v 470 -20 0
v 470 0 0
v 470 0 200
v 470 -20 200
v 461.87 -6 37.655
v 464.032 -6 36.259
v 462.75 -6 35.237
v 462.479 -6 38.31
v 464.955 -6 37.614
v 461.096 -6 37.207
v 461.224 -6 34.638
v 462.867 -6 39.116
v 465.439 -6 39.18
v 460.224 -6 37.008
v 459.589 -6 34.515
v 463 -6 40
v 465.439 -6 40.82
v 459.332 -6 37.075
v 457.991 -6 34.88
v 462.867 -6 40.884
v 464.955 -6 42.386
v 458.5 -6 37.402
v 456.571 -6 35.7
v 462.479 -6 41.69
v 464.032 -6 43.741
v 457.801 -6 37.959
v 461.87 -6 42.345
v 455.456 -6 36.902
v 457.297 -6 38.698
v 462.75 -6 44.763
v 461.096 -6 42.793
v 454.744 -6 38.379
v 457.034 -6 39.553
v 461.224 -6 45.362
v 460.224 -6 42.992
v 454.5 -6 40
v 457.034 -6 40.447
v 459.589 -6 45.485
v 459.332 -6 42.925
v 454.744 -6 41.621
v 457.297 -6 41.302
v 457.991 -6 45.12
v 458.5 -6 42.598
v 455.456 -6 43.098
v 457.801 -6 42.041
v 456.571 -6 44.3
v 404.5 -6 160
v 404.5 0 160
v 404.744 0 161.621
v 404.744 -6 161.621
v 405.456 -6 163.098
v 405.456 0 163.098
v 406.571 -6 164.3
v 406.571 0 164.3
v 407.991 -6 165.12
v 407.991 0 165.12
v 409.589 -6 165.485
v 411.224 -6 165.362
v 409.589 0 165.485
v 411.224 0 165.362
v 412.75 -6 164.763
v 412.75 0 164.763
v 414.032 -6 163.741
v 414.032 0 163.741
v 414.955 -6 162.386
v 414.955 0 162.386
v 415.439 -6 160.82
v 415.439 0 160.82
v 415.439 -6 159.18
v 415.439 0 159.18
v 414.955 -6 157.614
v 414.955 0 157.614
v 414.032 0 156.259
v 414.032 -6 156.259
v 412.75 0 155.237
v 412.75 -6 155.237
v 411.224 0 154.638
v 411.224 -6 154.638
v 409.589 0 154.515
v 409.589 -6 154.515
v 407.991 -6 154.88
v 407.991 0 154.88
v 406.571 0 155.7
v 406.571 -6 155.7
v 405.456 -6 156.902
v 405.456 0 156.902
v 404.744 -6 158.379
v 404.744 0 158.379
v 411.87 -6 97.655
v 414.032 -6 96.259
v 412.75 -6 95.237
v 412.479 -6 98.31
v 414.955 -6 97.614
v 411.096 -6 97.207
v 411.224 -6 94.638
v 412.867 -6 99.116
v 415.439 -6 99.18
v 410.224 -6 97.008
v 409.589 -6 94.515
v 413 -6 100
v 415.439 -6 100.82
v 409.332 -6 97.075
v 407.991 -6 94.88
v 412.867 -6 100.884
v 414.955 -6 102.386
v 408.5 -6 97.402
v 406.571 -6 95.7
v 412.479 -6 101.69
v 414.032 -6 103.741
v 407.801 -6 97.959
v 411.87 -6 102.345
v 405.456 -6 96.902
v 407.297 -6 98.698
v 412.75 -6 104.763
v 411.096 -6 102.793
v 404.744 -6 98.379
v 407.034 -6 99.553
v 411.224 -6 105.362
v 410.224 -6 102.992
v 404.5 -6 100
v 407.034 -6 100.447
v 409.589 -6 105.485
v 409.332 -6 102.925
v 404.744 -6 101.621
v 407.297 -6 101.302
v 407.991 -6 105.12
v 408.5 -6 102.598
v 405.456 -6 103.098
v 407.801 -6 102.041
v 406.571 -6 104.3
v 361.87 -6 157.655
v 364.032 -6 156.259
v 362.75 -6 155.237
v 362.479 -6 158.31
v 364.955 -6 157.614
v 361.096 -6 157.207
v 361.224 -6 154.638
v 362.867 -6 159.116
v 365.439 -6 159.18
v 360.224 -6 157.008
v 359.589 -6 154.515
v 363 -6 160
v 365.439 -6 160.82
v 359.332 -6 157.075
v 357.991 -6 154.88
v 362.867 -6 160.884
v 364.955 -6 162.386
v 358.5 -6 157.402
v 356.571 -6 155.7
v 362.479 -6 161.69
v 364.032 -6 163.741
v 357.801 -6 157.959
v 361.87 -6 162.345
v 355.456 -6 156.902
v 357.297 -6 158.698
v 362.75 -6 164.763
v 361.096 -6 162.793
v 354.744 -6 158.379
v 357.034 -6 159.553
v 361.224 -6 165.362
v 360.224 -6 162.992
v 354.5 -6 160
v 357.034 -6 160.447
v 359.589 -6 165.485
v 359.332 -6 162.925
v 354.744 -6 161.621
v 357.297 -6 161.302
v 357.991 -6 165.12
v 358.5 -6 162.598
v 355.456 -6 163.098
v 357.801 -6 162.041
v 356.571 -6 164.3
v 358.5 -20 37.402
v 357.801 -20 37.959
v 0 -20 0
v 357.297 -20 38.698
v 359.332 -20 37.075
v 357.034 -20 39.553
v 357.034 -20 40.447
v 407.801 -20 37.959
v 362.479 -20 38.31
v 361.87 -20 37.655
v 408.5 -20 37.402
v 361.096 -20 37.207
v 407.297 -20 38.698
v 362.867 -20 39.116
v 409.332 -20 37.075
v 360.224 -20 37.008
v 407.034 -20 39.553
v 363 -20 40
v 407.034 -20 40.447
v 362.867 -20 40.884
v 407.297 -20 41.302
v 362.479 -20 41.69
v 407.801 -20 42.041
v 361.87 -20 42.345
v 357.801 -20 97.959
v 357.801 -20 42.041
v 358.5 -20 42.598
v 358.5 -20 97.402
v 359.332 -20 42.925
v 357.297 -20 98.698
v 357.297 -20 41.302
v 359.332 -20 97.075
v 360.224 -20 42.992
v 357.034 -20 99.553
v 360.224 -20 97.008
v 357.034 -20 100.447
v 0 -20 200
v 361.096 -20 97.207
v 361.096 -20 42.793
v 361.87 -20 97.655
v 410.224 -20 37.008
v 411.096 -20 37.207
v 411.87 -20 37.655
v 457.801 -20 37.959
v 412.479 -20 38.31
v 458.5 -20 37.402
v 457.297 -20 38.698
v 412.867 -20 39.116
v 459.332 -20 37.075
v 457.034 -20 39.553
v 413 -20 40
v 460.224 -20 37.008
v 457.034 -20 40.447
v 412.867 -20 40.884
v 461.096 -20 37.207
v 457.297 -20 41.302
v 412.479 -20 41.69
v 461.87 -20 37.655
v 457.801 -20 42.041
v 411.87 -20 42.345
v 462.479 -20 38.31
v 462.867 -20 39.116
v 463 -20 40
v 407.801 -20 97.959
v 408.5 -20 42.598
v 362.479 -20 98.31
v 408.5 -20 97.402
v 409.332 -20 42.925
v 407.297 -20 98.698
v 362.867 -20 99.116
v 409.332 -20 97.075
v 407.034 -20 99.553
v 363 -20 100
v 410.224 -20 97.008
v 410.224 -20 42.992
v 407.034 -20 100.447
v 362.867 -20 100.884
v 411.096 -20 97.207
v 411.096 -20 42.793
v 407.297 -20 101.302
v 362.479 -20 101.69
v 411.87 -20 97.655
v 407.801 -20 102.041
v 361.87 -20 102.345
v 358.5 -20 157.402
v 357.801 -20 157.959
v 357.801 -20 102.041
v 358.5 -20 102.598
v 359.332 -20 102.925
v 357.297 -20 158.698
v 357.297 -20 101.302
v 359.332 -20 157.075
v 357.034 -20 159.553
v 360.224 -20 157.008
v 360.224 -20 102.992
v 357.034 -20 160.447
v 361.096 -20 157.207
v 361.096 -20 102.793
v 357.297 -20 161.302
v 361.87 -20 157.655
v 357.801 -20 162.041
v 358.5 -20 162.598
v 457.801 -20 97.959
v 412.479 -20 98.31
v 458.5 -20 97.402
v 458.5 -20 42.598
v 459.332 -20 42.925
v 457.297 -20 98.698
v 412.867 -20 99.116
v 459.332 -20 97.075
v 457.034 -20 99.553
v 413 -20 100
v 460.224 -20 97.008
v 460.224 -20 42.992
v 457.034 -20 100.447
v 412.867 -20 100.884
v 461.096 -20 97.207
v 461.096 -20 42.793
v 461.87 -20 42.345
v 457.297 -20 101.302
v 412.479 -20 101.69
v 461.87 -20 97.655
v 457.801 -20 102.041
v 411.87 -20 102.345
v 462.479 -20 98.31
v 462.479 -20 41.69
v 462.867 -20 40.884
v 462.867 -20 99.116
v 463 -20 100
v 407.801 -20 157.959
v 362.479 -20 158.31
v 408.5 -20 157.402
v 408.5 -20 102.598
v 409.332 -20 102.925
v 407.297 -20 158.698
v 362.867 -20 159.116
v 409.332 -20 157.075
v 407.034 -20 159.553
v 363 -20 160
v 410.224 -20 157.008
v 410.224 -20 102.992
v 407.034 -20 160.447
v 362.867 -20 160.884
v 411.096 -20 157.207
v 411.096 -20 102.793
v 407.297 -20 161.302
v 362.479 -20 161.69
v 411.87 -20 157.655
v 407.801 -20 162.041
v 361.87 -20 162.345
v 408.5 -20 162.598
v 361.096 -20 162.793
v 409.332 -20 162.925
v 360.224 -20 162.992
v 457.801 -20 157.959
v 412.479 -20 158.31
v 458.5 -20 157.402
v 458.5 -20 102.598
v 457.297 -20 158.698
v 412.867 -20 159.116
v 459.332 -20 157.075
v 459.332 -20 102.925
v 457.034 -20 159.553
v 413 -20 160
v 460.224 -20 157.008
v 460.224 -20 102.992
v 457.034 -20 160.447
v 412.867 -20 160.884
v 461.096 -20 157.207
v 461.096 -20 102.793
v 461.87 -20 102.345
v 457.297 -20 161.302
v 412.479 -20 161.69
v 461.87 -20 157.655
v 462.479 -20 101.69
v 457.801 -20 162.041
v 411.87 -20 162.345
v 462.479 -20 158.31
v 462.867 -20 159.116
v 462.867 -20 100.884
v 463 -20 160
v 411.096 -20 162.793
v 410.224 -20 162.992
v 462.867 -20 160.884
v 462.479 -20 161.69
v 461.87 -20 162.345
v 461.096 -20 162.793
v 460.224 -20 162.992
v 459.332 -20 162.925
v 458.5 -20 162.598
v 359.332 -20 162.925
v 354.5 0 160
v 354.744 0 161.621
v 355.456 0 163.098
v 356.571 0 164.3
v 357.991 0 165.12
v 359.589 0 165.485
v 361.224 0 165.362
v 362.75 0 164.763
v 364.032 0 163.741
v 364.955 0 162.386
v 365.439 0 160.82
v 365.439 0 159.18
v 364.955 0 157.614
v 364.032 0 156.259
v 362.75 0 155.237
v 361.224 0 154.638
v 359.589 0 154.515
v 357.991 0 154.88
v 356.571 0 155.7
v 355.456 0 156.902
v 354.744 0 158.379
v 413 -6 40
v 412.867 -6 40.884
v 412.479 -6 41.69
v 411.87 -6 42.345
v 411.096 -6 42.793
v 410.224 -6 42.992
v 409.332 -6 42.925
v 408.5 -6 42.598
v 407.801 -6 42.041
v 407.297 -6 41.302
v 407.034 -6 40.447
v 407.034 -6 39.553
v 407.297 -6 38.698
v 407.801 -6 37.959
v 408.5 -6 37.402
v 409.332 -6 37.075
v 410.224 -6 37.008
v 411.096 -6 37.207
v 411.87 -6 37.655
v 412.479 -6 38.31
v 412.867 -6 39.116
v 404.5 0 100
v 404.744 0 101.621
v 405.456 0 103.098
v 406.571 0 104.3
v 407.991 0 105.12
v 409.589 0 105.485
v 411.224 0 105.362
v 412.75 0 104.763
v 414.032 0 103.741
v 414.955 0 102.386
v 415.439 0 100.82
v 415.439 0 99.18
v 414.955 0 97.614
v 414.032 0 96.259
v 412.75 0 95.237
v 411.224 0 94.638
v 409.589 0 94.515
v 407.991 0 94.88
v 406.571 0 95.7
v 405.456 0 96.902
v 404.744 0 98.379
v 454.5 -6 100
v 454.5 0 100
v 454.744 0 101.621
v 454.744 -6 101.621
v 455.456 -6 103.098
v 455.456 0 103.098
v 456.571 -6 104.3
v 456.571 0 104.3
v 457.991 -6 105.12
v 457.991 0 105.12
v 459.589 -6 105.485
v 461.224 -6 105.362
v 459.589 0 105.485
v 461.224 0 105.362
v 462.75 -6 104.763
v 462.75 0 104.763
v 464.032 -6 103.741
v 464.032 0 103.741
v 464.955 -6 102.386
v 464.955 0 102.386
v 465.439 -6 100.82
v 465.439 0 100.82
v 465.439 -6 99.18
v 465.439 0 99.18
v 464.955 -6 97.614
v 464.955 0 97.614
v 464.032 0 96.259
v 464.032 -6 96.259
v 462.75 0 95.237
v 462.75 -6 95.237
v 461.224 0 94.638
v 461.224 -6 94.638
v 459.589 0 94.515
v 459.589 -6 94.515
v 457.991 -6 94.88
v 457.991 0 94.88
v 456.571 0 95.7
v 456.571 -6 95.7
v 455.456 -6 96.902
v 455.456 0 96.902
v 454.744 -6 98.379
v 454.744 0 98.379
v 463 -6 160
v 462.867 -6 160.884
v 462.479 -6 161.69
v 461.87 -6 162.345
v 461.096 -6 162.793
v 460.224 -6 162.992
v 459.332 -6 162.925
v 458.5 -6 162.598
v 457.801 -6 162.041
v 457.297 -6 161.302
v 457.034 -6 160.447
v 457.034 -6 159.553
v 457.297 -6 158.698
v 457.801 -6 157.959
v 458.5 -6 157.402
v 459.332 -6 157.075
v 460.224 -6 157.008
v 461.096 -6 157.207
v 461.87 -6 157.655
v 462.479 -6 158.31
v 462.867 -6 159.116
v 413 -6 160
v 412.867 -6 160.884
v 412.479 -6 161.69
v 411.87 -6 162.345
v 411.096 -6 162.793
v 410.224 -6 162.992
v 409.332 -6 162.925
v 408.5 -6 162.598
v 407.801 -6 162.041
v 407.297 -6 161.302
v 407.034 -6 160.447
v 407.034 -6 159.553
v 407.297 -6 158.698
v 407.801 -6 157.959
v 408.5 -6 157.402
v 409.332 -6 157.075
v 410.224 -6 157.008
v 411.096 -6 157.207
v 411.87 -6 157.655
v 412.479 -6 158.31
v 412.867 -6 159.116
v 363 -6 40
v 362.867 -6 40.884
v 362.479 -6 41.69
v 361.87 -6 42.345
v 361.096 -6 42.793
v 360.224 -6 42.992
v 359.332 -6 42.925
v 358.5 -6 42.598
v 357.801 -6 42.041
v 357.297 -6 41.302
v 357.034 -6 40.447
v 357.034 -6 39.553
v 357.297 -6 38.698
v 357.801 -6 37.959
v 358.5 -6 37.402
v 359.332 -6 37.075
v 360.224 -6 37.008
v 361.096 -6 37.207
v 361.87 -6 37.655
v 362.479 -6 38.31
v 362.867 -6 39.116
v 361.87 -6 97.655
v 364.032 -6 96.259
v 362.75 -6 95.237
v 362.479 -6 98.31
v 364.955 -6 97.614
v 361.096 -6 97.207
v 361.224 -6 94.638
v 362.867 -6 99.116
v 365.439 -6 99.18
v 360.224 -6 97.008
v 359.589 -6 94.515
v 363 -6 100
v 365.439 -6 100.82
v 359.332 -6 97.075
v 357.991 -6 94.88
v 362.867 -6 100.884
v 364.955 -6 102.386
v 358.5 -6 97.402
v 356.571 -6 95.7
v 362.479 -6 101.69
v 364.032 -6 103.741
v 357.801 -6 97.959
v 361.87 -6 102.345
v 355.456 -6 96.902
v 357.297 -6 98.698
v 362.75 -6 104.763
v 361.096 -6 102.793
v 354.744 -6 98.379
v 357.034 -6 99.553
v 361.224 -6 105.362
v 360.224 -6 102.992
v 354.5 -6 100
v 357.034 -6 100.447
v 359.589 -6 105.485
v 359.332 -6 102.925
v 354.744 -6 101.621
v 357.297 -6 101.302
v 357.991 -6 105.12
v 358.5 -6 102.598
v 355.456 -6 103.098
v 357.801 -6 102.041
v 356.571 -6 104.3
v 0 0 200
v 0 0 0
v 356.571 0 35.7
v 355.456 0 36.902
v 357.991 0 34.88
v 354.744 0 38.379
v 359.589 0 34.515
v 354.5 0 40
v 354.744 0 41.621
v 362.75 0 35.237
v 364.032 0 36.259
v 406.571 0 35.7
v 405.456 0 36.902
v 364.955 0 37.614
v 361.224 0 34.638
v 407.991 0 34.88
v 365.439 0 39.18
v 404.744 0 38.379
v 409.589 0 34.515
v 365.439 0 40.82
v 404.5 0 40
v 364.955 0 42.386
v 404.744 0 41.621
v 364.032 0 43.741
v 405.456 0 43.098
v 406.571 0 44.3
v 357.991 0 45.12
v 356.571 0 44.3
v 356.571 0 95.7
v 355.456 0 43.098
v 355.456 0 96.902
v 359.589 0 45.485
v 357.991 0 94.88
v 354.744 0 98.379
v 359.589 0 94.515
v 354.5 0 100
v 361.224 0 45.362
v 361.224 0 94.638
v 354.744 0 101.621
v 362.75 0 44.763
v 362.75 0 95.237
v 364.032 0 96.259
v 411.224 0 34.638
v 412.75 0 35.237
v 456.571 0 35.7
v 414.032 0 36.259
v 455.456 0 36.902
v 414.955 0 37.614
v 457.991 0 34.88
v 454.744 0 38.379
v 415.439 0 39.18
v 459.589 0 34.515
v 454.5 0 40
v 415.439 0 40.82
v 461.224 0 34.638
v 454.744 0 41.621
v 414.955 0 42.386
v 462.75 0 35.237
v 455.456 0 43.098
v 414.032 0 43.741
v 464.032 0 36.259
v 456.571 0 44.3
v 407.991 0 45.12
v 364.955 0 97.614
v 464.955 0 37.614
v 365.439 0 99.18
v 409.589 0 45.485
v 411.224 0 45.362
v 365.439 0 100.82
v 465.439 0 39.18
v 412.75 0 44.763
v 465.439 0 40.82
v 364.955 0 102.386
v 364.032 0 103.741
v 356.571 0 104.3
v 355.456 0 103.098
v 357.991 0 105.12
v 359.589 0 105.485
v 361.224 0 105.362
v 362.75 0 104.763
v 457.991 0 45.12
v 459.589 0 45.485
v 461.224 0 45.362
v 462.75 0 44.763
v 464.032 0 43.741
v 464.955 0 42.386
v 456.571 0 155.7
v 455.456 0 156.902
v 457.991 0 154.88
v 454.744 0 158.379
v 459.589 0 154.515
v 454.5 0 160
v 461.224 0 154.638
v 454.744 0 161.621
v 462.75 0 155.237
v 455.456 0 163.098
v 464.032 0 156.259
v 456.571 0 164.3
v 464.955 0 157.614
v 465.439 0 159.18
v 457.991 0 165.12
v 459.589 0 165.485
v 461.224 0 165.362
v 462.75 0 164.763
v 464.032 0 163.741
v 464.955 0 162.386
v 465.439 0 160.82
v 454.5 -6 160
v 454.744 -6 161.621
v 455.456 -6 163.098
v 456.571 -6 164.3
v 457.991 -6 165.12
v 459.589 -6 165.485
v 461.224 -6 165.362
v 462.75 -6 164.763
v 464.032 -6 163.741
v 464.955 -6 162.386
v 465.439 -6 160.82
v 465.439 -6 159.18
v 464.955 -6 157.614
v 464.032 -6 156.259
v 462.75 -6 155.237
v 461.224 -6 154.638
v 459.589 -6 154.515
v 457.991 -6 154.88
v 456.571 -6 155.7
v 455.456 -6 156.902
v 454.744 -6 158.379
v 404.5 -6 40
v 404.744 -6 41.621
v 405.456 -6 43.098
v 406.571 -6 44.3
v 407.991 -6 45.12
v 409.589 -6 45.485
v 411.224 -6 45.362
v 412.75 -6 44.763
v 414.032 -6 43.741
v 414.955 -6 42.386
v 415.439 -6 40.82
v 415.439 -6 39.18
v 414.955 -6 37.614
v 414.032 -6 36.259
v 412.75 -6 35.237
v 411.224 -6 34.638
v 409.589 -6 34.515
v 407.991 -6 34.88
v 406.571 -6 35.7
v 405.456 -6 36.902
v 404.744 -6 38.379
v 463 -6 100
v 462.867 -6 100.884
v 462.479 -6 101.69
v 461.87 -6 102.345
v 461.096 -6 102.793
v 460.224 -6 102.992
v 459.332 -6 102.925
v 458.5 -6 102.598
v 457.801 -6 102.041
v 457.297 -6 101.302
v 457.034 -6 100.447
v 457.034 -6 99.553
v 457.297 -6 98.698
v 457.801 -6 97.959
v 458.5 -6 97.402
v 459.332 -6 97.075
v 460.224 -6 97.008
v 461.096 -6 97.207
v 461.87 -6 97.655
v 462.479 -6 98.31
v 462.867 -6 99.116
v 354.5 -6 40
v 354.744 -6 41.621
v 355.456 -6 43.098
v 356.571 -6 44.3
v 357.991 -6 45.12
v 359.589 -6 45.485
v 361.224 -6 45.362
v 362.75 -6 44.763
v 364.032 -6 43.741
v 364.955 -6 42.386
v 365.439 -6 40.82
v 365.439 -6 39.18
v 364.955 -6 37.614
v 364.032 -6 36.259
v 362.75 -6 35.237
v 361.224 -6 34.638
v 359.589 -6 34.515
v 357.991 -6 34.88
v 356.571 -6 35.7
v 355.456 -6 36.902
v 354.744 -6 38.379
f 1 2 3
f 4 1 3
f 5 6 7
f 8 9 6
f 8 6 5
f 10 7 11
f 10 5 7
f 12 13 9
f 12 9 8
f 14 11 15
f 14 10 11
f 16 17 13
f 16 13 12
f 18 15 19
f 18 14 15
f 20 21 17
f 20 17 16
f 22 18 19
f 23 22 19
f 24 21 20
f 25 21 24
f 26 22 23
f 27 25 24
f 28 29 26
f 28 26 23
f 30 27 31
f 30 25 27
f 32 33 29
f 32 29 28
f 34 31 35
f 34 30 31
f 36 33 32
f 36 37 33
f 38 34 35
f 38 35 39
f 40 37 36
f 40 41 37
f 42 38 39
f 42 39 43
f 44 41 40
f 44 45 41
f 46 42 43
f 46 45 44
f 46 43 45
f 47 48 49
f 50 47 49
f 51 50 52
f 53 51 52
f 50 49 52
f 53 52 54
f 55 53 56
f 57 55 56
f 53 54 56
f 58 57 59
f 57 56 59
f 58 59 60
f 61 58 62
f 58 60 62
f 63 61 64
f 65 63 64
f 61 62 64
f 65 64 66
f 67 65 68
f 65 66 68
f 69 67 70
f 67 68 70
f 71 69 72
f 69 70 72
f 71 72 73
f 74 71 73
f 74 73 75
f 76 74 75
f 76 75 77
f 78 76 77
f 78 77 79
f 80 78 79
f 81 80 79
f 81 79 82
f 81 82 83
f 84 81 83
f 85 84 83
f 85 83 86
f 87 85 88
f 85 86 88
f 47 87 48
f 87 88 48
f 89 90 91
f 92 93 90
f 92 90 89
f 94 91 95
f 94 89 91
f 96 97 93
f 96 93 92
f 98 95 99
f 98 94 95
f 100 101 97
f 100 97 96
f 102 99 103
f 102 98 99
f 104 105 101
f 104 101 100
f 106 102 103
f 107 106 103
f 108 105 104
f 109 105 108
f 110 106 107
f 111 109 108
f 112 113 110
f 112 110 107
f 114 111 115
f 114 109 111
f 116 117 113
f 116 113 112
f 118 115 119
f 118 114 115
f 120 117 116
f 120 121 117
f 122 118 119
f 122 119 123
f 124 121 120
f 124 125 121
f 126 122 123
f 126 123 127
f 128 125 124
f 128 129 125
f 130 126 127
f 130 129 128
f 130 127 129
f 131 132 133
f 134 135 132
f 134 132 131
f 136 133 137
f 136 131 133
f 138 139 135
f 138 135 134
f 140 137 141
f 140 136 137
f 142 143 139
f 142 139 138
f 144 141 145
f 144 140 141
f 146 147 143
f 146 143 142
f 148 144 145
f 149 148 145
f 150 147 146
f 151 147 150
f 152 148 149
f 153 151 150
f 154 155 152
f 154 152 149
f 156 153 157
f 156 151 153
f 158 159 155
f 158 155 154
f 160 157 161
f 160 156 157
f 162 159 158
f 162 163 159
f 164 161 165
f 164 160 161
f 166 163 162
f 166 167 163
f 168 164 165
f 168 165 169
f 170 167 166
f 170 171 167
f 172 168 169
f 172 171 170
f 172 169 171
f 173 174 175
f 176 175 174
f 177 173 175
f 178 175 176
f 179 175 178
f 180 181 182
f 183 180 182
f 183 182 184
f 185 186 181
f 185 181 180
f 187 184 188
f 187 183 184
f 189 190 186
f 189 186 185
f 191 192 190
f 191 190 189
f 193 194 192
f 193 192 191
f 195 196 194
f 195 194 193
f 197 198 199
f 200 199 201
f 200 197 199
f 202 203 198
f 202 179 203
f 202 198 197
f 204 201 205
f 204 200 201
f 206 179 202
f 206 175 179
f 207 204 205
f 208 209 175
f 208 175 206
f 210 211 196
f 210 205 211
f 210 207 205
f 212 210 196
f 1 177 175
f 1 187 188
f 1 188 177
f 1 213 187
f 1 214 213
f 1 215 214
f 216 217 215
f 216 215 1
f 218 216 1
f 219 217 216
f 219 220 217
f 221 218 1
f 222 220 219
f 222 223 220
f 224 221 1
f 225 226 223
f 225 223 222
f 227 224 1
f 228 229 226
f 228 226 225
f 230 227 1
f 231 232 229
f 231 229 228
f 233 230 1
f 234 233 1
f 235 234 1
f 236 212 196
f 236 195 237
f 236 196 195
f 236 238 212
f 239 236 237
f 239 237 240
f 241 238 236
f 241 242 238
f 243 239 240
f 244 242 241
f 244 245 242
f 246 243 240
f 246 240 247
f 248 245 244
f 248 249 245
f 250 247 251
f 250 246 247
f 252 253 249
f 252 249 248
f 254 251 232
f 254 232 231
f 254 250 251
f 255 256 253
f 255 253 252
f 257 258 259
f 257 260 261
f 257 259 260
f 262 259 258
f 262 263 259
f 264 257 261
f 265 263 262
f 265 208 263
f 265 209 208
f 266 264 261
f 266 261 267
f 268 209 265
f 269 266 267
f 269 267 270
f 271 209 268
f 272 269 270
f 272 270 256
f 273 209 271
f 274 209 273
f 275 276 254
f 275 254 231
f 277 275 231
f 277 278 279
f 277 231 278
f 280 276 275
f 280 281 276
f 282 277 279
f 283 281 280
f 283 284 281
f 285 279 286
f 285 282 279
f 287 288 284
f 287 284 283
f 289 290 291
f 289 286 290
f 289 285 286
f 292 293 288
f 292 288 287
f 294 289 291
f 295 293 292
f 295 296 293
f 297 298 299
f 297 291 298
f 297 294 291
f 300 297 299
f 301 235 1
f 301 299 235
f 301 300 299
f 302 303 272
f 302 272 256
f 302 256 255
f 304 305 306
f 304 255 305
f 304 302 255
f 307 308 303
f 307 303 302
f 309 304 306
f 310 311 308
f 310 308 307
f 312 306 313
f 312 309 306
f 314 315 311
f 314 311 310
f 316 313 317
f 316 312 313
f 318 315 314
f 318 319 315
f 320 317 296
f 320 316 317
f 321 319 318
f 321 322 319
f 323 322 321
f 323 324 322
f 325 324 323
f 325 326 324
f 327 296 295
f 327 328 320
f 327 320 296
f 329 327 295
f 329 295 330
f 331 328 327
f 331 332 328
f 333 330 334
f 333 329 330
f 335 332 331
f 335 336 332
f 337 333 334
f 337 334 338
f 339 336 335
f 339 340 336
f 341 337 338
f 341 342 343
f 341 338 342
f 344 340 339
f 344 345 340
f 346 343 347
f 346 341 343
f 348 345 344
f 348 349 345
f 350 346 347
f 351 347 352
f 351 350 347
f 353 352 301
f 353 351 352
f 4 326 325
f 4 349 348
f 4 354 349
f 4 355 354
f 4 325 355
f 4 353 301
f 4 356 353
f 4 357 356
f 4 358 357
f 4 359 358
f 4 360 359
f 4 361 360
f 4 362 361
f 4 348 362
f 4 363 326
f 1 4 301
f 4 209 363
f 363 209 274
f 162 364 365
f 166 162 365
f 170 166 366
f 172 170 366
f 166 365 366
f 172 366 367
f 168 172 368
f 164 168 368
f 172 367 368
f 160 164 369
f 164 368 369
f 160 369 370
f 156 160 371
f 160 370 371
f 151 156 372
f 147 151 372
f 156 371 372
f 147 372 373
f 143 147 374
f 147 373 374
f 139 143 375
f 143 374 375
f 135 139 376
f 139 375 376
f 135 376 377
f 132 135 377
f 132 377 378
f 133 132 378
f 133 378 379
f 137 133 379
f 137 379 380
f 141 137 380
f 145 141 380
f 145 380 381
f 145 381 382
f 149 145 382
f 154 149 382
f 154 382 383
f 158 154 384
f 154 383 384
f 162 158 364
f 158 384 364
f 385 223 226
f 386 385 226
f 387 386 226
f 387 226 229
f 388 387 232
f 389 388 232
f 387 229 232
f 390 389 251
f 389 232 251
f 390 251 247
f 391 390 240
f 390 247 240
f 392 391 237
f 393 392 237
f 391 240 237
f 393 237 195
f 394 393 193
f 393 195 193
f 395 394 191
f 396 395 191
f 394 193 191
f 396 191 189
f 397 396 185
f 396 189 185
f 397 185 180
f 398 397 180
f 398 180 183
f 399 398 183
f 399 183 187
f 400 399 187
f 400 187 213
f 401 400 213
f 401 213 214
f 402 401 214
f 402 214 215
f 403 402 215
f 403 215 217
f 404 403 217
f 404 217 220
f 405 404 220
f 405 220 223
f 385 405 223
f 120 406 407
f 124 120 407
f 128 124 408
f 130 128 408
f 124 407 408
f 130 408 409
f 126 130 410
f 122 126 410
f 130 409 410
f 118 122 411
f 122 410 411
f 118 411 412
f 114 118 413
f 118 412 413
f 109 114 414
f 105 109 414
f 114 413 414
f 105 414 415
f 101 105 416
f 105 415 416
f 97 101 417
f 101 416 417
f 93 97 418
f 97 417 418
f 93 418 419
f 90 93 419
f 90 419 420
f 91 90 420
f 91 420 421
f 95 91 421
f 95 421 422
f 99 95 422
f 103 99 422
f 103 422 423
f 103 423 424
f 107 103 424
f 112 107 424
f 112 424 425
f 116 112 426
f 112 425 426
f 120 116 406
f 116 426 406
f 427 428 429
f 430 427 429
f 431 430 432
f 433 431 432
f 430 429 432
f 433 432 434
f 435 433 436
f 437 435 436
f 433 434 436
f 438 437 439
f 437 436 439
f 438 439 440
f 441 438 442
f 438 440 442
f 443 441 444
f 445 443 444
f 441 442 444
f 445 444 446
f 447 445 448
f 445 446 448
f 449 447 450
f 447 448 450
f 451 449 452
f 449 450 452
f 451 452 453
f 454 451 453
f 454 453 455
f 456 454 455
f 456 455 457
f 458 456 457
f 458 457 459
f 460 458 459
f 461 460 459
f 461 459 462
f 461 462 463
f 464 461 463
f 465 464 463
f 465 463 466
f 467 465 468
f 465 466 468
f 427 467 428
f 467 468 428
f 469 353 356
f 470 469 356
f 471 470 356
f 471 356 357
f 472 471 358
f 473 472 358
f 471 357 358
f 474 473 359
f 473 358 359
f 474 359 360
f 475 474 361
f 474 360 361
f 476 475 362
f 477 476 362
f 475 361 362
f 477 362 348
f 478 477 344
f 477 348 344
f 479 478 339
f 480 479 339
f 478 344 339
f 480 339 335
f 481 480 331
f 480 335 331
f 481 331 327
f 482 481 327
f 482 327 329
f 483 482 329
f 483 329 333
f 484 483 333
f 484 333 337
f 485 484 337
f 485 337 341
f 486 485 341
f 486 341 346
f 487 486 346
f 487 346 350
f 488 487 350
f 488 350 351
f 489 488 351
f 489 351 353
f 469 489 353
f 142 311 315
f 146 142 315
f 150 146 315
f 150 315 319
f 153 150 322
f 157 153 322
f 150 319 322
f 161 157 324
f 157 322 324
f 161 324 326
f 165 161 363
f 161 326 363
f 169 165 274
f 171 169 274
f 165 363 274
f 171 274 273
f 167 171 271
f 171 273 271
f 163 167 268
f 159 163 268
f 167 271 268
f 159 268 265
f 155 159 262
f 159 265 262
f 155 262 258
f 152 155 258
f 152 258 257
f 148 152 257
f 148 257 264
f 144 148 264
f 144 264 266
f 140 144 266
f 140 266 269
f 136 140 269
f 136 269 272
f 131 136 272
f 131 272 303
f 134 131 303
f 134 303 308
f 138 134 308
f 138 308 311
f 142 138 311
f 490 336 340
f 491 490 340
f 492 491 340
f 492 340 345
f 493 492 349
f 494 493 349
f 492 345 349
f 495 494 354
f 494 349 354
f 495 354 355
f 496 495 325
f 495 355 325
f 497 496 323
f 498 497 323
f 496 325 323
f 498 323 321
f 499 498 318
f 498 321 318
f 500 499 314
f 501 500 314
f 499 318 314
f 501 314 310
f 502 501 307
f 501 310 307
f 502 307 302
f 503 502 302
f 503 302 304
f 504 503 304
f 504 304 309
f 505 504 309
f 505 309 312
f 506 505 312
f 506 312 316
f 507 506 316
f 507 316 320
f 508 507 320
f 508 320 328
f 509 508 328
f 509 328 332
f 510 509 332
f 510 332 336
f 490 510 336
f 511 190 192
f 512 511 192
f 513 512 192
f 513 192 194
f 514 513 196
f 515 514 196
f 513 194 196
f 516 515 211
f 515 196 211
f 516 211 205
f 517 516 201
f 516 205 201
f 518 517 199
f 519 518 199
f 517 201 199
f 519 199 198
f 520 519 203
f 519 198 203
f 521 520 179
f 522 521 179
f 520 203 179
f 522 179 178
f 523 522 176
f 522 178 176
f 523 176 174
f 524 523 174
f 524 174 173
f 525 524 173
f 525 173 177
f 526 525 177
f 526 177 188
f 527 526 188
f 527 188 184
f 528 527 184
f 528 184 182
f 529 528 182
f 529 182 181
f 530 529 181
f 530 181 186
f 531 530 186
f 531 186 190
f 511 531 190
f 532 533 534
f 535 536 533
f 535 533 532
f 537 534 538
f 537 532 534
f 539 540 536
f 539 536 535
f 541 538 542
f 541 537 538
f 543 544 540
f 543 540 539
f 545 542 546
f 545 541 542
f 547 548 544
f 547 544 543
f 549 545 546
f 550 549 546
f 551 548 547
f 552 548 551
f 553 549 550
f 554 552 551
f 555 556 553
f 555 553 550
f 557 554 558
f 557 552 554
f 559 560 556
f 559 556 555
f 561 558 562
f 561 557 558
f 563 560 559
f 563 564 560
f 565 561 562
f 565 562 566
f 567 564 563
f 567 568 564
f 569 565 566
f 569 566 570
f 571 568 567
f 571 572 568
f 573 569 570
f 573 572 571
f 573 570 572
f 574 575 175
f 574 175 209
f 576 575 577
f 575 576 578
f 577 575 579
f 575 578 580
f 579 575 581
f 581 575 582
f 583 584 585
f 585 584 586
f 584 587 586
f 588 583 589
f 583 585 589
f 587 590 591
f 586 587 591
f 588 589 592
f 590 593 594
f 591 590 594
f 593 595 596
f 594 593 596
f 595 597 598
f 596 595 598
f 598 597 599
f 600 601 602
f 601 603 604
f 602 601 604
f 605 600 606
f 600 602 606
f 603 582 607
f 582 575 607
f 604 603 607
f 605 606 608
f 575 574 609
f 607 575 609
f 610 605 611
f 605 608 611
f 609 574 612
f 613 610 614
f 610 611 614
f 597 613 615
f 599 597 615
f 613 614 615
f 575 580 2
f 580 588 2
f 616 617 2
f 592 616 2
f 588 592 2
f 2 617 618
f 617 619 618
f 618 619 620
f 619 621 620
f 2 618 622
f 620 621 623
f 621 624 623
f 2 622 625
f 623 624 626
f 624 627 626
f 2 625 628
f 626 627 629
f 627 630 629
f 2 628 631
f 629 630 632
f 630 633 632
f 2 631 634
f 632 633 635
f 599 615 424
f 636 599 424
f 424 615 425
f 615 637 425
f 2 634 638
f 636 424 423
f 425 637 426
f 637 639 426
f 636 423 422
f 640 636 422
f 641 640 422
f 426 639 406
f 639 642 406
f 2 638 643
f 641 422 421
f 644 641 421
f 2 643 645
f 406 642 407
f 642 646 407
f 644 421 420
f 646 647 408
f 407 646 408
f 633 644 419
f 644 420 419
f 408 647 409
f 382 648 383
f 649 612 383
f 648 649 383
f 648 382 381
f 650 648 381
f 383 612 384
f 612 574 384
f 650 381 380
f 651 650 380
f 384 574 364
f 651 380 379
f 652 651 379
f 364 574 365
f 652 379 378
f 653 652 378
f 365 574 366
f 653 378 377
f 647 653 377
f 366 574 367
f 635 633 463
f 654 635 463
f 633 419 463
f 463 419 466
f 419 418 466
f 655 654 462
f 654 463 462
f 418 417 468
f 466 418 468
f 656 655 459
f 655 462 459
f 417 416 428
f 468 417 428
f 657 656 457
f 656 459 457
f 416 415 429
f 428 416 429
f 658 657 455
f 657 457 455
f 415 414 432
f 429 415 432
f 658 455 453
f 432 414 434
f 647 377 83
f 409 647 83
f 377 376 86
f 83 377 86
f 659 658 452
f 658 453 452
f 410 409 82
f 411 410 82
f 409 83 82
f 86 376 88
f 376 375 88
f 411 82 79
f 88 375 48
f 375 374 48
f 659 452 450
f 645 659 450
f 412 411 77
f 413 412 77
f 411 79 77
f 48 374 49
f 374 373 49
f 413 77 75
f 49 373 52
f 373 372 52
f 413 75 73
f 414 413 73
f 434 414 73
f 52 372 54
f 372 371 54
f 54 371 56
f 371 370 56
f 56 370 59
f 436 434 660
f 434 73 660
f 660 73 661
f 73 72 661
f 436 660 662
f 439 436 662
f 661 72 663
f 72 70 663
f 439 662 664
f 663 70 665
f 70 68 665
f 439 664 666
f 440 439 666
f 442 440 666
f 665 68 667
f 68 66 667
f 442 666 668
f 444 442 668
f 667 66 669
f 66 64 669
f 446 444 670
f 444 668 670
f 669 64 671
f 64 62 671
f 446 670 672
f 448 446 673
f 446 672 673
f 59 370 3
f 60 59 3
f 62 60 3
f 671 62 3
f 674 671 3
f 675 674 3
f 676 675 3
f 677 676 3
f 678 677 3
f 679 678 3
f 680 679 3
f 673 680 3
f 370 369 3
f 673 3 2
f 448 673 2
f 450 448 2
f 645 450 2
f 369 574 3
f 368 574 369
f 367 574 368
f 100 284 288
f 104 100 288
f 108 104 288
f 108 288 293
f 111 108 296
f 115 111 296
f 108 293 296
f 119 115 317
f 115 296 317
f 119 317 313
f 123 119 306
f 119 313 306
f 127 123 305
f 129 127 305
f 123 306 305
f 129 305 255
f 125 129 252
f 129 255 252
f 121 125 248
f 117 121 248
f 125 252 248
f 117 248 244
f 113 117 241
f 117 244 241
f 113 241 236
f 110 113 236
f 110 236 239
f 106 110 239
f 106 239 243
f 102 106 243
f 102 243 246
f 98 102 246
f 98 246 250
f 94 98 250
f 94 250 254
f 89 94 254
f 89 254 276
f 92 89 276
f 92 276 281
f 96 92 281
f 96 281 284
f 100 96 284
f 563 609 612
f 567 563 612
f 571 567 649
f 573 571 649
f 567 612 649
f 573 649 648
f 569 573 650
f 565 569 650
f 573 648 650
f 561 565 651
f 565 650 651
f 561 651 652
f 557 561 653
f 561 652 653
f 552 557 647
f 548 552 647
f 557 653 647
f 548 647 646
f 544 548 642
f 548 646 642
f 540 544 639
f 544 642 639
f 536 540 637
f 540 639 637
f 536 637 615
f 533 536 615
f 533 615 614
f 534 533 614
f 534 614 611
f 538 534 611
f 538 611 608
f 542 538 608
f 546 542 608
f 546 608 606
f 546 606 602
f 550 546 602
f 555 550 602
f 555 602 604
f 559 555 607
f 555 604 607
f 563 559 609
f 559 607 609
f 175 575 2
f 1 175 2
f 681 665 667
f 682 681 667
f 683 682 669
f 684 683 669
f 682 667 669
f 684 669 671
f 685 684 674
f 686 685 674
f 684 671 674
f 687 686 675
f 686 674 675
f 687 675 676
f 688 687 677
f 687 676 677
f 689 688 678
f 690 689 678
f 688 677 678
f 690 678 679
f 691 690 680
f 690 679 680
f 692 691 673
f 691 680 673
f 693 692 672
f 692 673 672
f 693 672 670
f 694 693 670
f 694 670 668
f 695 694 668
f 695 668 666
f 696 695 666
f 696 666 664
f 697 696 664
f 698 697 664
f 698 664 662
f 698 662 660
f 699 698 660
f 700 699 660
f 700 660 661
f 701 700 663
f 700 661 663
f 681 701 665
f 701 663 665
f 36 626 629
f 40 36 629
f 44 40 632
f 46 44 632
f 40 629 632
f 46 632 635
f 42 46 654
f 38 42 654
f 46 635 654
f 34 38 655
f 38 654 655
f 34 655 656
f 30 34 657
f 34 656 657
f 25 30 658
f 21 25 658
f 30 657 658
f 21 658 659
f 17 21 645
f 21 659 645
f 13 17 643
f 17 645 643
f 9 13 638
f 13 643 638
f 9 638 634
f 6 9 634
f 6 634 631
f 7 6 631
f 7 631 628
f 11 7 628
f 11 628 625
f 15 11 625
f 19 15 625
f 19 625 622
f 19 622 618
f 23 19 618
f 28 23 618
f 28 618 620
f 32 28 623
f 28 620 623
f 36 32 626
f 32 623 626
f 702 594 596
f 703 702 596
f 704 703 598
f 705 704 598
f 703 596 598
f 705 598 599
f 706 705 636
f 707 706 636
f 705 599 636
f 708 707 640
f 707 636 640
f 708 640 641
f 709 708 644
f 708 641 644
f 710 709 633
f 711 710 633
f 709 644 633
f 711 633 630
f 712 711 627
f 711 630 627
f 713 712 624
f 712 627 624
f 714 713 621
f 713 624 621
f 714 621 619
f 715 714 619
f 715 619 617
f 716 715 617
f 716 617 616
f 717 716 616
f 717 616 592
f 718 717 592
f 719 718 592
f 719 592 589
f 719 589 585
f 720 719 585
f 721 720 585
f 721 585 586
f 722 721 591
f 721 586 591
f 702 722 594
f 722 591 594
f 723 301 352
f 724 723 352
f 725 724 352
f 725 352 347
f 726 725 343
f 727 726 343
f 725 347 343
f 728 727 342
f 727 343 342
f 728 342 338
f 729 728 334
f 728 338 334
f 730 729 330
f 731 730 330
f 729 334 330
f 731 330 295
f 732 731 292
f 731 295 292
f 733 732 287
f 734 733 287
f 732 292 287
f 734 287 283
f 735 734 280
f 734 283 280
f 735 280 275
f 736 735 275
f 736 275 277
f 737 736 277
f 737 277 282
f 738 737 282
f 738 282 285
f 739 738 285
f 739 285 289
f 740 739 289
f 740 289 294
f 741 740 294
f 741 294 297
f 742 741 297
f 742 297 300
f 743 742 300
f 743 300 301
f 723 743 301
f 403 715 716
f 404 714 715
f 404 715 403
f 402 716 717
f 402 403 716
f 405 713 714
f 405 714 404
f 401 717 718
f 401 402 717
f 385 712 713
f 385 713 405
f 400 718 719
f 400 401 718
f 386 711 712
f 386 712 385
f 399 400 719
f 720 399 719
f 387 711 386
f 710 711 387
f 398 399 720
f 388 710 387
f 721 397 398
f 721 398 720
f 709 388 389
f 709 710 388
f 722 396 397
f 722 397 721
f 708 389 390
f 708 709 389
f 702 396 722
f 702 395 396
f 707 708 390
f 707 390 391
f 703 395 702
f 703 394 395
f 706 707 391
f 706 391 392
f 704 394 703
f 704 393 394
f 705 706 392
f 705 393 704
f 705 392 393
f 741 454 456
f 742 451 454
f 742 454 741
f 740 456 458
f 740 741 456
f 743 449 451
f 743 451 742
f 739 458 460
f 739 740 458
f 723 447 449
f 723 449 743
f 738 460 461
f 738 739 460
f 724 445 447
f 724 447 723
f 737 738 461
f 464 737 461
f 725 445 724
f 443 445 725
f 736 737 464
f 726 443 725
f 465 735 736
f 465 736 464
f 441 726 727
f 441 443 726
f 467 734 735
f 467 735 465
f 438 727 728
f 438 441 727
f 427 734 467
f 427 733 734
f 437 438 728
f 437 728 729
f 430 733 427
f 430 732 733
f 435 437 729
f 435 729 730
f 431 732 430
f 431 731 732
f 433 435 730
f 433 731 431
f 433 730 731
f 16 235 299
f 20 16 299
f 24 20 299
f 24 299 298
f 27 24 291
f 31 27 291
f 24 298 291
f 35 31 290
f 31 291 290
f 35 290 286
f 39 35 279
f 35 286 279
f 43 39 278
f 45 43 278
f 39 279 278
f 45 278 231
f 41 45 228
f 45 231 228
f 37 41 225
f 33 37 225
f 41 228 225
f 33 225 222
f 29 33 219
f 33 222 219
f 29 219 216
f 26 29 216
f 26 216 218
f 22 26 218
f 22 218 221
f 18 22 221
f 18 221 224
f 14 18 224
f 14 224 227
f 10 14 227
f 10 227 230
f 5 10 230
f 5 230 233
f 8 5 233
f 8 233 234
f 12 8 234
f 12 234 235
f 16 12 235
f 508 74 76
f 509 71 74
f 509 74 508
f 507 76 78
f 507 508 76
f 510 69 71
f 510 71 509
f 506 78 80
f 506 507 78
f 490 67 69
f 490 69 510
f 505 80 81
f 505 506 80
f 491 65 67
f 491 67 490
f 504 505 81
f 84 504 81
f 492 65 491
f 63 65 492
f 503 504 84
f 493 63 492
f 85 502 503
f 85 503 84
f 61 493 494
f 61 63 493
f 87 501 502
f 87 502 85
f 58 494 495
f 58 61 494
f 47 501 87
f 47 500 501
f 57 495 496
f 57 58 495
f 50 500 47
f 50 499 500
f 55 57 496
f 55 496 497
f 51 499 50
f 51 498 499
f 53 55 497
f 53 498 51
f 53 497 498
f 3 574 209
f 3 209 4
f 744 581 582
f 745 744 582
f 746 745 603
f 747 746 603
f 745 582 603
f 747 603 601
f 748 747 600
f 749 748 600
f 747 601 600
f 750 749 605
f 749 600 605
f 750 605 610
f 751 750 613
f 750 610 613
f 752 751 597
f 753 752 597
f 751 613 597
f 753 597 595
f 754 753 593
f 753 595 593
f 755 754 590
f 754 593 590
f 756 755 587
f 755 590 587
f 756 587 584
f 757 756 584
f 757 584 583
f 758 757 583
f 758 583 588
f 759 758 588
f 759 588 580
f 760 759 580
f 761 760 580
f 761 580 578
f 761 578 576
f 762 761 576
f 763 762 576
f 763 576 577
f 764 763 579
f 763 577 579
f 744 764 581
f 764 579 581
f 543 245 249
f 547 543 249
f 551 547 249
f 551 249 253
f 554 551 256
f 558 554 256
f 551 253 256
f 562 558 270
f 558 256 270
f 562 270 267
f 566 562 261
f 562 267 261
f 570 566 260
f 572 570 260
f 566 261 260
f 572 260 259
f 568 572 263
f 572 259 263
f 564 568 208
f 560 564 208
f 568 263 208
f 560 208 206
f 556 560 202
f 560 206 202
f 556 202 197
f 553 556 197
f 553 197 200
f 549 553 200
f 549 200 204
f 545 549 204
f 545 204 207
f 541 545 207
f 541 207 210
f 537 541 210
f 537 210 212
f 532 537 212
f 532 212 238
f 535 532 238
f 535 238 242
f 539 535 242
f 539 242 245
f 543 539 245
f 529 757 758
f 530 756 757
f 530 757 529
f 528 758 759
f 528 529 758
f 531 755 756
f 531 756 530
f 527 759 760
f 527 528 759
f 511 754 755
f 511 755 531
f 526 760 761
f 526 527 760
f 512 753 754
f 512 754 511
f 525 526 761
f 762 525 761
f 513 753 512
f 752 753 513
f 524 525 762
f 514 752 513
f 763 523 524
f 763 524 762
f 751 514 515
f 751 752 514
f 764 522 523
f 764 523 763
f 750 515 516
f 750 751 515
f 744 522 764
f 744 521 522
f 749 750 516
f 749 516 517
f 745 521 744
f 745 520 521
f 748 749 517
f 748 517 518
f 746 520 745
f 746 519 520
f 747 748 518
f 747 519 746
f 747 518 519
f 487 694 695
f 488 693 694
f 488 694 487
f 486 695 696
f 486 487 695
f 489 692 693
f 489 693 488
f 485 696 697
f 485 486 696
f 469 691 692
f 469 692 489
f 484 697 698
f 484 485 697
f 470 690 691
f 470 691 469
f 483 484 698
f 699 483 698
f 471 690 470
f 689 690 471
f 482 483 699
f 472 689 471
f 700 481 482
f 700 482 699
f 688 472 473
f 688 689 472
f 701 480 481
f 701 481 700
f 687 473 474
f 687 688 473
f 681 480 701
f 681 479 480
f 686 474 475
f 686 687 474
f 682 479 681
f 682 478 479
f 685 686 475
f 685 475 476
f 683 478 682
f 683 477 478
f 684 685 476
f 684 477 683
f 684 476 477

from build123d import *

# Parameters (mm, degrees)
F0_W     = 470
F0_H     = 200
F1_DEPTH = 20
F2_R     = 3
F3_DEPTH = 20
F4_R     = 5.5
F5_DEPTH = 6


with BuildPart() as f1:
    # F0 (on Front) → F1 (new body)
    with BuildSketch(Plane.XZ):
        with Locations((235, 100)):
            Rectangle(F0_W, F0_H)
    extrude(amount=F1_DEPTH)

    # F2 (on face) → F3 (cut)
    with BuildSketch(Plane.XZ.offset(20)):
        with Locations((360, 160)):
            Circle(F2_R)
        with Locations((360, 100)):
            Circle(F2_R)
        with Locations((360, 40)):
            Circle(F2_R)
        with Locations((410, 160)):
            Circle(F2_R)
        with Locations((410, 100)):
            Circle(F2_R)
        with Locations((410, 40)):
            Circle(F2_R)
        with Locations((460, 160)):
            Circle(F2_R)
        with Locations((460, 100)):
            Circle(F2_R)
        with Locations((460, 40)):
            Circle(F2_R)
    extrude(amount=-F3_DEPTH, mode=Mode.SUBTRACT)

    # F4 (on face) → F5 (cut)
    with BuildSketch(Plane(origin=(0, 0, 0), x_dir=(-1, 0, 0), z_dir=(0, 1, 0))):
        with Locations((-460, 160)):
            Circle(F4_R)
        with Locations((-410, 160)):
            Circle(F4_R)
        with Locations((-360, 160)):
            Circle(F4_R)
        with Locations((-360, 100)):
            Circle(F4_R)
        with Locations((-410, 100)):
            Circle(F4_R)
        with Locations((-460, 100)):
            Circle(F4_R)
        with Locations((-460, 40)):
            Circle(F4_R)
        with Locations((-410, 40)):
            Circle(F4_R)
        with Locations((-360, 40)):
            Circle(F4_R)
    extrude(amount=-F5_DEPTH, mode=Mode.SUBTRACT)


solid = f1.part
